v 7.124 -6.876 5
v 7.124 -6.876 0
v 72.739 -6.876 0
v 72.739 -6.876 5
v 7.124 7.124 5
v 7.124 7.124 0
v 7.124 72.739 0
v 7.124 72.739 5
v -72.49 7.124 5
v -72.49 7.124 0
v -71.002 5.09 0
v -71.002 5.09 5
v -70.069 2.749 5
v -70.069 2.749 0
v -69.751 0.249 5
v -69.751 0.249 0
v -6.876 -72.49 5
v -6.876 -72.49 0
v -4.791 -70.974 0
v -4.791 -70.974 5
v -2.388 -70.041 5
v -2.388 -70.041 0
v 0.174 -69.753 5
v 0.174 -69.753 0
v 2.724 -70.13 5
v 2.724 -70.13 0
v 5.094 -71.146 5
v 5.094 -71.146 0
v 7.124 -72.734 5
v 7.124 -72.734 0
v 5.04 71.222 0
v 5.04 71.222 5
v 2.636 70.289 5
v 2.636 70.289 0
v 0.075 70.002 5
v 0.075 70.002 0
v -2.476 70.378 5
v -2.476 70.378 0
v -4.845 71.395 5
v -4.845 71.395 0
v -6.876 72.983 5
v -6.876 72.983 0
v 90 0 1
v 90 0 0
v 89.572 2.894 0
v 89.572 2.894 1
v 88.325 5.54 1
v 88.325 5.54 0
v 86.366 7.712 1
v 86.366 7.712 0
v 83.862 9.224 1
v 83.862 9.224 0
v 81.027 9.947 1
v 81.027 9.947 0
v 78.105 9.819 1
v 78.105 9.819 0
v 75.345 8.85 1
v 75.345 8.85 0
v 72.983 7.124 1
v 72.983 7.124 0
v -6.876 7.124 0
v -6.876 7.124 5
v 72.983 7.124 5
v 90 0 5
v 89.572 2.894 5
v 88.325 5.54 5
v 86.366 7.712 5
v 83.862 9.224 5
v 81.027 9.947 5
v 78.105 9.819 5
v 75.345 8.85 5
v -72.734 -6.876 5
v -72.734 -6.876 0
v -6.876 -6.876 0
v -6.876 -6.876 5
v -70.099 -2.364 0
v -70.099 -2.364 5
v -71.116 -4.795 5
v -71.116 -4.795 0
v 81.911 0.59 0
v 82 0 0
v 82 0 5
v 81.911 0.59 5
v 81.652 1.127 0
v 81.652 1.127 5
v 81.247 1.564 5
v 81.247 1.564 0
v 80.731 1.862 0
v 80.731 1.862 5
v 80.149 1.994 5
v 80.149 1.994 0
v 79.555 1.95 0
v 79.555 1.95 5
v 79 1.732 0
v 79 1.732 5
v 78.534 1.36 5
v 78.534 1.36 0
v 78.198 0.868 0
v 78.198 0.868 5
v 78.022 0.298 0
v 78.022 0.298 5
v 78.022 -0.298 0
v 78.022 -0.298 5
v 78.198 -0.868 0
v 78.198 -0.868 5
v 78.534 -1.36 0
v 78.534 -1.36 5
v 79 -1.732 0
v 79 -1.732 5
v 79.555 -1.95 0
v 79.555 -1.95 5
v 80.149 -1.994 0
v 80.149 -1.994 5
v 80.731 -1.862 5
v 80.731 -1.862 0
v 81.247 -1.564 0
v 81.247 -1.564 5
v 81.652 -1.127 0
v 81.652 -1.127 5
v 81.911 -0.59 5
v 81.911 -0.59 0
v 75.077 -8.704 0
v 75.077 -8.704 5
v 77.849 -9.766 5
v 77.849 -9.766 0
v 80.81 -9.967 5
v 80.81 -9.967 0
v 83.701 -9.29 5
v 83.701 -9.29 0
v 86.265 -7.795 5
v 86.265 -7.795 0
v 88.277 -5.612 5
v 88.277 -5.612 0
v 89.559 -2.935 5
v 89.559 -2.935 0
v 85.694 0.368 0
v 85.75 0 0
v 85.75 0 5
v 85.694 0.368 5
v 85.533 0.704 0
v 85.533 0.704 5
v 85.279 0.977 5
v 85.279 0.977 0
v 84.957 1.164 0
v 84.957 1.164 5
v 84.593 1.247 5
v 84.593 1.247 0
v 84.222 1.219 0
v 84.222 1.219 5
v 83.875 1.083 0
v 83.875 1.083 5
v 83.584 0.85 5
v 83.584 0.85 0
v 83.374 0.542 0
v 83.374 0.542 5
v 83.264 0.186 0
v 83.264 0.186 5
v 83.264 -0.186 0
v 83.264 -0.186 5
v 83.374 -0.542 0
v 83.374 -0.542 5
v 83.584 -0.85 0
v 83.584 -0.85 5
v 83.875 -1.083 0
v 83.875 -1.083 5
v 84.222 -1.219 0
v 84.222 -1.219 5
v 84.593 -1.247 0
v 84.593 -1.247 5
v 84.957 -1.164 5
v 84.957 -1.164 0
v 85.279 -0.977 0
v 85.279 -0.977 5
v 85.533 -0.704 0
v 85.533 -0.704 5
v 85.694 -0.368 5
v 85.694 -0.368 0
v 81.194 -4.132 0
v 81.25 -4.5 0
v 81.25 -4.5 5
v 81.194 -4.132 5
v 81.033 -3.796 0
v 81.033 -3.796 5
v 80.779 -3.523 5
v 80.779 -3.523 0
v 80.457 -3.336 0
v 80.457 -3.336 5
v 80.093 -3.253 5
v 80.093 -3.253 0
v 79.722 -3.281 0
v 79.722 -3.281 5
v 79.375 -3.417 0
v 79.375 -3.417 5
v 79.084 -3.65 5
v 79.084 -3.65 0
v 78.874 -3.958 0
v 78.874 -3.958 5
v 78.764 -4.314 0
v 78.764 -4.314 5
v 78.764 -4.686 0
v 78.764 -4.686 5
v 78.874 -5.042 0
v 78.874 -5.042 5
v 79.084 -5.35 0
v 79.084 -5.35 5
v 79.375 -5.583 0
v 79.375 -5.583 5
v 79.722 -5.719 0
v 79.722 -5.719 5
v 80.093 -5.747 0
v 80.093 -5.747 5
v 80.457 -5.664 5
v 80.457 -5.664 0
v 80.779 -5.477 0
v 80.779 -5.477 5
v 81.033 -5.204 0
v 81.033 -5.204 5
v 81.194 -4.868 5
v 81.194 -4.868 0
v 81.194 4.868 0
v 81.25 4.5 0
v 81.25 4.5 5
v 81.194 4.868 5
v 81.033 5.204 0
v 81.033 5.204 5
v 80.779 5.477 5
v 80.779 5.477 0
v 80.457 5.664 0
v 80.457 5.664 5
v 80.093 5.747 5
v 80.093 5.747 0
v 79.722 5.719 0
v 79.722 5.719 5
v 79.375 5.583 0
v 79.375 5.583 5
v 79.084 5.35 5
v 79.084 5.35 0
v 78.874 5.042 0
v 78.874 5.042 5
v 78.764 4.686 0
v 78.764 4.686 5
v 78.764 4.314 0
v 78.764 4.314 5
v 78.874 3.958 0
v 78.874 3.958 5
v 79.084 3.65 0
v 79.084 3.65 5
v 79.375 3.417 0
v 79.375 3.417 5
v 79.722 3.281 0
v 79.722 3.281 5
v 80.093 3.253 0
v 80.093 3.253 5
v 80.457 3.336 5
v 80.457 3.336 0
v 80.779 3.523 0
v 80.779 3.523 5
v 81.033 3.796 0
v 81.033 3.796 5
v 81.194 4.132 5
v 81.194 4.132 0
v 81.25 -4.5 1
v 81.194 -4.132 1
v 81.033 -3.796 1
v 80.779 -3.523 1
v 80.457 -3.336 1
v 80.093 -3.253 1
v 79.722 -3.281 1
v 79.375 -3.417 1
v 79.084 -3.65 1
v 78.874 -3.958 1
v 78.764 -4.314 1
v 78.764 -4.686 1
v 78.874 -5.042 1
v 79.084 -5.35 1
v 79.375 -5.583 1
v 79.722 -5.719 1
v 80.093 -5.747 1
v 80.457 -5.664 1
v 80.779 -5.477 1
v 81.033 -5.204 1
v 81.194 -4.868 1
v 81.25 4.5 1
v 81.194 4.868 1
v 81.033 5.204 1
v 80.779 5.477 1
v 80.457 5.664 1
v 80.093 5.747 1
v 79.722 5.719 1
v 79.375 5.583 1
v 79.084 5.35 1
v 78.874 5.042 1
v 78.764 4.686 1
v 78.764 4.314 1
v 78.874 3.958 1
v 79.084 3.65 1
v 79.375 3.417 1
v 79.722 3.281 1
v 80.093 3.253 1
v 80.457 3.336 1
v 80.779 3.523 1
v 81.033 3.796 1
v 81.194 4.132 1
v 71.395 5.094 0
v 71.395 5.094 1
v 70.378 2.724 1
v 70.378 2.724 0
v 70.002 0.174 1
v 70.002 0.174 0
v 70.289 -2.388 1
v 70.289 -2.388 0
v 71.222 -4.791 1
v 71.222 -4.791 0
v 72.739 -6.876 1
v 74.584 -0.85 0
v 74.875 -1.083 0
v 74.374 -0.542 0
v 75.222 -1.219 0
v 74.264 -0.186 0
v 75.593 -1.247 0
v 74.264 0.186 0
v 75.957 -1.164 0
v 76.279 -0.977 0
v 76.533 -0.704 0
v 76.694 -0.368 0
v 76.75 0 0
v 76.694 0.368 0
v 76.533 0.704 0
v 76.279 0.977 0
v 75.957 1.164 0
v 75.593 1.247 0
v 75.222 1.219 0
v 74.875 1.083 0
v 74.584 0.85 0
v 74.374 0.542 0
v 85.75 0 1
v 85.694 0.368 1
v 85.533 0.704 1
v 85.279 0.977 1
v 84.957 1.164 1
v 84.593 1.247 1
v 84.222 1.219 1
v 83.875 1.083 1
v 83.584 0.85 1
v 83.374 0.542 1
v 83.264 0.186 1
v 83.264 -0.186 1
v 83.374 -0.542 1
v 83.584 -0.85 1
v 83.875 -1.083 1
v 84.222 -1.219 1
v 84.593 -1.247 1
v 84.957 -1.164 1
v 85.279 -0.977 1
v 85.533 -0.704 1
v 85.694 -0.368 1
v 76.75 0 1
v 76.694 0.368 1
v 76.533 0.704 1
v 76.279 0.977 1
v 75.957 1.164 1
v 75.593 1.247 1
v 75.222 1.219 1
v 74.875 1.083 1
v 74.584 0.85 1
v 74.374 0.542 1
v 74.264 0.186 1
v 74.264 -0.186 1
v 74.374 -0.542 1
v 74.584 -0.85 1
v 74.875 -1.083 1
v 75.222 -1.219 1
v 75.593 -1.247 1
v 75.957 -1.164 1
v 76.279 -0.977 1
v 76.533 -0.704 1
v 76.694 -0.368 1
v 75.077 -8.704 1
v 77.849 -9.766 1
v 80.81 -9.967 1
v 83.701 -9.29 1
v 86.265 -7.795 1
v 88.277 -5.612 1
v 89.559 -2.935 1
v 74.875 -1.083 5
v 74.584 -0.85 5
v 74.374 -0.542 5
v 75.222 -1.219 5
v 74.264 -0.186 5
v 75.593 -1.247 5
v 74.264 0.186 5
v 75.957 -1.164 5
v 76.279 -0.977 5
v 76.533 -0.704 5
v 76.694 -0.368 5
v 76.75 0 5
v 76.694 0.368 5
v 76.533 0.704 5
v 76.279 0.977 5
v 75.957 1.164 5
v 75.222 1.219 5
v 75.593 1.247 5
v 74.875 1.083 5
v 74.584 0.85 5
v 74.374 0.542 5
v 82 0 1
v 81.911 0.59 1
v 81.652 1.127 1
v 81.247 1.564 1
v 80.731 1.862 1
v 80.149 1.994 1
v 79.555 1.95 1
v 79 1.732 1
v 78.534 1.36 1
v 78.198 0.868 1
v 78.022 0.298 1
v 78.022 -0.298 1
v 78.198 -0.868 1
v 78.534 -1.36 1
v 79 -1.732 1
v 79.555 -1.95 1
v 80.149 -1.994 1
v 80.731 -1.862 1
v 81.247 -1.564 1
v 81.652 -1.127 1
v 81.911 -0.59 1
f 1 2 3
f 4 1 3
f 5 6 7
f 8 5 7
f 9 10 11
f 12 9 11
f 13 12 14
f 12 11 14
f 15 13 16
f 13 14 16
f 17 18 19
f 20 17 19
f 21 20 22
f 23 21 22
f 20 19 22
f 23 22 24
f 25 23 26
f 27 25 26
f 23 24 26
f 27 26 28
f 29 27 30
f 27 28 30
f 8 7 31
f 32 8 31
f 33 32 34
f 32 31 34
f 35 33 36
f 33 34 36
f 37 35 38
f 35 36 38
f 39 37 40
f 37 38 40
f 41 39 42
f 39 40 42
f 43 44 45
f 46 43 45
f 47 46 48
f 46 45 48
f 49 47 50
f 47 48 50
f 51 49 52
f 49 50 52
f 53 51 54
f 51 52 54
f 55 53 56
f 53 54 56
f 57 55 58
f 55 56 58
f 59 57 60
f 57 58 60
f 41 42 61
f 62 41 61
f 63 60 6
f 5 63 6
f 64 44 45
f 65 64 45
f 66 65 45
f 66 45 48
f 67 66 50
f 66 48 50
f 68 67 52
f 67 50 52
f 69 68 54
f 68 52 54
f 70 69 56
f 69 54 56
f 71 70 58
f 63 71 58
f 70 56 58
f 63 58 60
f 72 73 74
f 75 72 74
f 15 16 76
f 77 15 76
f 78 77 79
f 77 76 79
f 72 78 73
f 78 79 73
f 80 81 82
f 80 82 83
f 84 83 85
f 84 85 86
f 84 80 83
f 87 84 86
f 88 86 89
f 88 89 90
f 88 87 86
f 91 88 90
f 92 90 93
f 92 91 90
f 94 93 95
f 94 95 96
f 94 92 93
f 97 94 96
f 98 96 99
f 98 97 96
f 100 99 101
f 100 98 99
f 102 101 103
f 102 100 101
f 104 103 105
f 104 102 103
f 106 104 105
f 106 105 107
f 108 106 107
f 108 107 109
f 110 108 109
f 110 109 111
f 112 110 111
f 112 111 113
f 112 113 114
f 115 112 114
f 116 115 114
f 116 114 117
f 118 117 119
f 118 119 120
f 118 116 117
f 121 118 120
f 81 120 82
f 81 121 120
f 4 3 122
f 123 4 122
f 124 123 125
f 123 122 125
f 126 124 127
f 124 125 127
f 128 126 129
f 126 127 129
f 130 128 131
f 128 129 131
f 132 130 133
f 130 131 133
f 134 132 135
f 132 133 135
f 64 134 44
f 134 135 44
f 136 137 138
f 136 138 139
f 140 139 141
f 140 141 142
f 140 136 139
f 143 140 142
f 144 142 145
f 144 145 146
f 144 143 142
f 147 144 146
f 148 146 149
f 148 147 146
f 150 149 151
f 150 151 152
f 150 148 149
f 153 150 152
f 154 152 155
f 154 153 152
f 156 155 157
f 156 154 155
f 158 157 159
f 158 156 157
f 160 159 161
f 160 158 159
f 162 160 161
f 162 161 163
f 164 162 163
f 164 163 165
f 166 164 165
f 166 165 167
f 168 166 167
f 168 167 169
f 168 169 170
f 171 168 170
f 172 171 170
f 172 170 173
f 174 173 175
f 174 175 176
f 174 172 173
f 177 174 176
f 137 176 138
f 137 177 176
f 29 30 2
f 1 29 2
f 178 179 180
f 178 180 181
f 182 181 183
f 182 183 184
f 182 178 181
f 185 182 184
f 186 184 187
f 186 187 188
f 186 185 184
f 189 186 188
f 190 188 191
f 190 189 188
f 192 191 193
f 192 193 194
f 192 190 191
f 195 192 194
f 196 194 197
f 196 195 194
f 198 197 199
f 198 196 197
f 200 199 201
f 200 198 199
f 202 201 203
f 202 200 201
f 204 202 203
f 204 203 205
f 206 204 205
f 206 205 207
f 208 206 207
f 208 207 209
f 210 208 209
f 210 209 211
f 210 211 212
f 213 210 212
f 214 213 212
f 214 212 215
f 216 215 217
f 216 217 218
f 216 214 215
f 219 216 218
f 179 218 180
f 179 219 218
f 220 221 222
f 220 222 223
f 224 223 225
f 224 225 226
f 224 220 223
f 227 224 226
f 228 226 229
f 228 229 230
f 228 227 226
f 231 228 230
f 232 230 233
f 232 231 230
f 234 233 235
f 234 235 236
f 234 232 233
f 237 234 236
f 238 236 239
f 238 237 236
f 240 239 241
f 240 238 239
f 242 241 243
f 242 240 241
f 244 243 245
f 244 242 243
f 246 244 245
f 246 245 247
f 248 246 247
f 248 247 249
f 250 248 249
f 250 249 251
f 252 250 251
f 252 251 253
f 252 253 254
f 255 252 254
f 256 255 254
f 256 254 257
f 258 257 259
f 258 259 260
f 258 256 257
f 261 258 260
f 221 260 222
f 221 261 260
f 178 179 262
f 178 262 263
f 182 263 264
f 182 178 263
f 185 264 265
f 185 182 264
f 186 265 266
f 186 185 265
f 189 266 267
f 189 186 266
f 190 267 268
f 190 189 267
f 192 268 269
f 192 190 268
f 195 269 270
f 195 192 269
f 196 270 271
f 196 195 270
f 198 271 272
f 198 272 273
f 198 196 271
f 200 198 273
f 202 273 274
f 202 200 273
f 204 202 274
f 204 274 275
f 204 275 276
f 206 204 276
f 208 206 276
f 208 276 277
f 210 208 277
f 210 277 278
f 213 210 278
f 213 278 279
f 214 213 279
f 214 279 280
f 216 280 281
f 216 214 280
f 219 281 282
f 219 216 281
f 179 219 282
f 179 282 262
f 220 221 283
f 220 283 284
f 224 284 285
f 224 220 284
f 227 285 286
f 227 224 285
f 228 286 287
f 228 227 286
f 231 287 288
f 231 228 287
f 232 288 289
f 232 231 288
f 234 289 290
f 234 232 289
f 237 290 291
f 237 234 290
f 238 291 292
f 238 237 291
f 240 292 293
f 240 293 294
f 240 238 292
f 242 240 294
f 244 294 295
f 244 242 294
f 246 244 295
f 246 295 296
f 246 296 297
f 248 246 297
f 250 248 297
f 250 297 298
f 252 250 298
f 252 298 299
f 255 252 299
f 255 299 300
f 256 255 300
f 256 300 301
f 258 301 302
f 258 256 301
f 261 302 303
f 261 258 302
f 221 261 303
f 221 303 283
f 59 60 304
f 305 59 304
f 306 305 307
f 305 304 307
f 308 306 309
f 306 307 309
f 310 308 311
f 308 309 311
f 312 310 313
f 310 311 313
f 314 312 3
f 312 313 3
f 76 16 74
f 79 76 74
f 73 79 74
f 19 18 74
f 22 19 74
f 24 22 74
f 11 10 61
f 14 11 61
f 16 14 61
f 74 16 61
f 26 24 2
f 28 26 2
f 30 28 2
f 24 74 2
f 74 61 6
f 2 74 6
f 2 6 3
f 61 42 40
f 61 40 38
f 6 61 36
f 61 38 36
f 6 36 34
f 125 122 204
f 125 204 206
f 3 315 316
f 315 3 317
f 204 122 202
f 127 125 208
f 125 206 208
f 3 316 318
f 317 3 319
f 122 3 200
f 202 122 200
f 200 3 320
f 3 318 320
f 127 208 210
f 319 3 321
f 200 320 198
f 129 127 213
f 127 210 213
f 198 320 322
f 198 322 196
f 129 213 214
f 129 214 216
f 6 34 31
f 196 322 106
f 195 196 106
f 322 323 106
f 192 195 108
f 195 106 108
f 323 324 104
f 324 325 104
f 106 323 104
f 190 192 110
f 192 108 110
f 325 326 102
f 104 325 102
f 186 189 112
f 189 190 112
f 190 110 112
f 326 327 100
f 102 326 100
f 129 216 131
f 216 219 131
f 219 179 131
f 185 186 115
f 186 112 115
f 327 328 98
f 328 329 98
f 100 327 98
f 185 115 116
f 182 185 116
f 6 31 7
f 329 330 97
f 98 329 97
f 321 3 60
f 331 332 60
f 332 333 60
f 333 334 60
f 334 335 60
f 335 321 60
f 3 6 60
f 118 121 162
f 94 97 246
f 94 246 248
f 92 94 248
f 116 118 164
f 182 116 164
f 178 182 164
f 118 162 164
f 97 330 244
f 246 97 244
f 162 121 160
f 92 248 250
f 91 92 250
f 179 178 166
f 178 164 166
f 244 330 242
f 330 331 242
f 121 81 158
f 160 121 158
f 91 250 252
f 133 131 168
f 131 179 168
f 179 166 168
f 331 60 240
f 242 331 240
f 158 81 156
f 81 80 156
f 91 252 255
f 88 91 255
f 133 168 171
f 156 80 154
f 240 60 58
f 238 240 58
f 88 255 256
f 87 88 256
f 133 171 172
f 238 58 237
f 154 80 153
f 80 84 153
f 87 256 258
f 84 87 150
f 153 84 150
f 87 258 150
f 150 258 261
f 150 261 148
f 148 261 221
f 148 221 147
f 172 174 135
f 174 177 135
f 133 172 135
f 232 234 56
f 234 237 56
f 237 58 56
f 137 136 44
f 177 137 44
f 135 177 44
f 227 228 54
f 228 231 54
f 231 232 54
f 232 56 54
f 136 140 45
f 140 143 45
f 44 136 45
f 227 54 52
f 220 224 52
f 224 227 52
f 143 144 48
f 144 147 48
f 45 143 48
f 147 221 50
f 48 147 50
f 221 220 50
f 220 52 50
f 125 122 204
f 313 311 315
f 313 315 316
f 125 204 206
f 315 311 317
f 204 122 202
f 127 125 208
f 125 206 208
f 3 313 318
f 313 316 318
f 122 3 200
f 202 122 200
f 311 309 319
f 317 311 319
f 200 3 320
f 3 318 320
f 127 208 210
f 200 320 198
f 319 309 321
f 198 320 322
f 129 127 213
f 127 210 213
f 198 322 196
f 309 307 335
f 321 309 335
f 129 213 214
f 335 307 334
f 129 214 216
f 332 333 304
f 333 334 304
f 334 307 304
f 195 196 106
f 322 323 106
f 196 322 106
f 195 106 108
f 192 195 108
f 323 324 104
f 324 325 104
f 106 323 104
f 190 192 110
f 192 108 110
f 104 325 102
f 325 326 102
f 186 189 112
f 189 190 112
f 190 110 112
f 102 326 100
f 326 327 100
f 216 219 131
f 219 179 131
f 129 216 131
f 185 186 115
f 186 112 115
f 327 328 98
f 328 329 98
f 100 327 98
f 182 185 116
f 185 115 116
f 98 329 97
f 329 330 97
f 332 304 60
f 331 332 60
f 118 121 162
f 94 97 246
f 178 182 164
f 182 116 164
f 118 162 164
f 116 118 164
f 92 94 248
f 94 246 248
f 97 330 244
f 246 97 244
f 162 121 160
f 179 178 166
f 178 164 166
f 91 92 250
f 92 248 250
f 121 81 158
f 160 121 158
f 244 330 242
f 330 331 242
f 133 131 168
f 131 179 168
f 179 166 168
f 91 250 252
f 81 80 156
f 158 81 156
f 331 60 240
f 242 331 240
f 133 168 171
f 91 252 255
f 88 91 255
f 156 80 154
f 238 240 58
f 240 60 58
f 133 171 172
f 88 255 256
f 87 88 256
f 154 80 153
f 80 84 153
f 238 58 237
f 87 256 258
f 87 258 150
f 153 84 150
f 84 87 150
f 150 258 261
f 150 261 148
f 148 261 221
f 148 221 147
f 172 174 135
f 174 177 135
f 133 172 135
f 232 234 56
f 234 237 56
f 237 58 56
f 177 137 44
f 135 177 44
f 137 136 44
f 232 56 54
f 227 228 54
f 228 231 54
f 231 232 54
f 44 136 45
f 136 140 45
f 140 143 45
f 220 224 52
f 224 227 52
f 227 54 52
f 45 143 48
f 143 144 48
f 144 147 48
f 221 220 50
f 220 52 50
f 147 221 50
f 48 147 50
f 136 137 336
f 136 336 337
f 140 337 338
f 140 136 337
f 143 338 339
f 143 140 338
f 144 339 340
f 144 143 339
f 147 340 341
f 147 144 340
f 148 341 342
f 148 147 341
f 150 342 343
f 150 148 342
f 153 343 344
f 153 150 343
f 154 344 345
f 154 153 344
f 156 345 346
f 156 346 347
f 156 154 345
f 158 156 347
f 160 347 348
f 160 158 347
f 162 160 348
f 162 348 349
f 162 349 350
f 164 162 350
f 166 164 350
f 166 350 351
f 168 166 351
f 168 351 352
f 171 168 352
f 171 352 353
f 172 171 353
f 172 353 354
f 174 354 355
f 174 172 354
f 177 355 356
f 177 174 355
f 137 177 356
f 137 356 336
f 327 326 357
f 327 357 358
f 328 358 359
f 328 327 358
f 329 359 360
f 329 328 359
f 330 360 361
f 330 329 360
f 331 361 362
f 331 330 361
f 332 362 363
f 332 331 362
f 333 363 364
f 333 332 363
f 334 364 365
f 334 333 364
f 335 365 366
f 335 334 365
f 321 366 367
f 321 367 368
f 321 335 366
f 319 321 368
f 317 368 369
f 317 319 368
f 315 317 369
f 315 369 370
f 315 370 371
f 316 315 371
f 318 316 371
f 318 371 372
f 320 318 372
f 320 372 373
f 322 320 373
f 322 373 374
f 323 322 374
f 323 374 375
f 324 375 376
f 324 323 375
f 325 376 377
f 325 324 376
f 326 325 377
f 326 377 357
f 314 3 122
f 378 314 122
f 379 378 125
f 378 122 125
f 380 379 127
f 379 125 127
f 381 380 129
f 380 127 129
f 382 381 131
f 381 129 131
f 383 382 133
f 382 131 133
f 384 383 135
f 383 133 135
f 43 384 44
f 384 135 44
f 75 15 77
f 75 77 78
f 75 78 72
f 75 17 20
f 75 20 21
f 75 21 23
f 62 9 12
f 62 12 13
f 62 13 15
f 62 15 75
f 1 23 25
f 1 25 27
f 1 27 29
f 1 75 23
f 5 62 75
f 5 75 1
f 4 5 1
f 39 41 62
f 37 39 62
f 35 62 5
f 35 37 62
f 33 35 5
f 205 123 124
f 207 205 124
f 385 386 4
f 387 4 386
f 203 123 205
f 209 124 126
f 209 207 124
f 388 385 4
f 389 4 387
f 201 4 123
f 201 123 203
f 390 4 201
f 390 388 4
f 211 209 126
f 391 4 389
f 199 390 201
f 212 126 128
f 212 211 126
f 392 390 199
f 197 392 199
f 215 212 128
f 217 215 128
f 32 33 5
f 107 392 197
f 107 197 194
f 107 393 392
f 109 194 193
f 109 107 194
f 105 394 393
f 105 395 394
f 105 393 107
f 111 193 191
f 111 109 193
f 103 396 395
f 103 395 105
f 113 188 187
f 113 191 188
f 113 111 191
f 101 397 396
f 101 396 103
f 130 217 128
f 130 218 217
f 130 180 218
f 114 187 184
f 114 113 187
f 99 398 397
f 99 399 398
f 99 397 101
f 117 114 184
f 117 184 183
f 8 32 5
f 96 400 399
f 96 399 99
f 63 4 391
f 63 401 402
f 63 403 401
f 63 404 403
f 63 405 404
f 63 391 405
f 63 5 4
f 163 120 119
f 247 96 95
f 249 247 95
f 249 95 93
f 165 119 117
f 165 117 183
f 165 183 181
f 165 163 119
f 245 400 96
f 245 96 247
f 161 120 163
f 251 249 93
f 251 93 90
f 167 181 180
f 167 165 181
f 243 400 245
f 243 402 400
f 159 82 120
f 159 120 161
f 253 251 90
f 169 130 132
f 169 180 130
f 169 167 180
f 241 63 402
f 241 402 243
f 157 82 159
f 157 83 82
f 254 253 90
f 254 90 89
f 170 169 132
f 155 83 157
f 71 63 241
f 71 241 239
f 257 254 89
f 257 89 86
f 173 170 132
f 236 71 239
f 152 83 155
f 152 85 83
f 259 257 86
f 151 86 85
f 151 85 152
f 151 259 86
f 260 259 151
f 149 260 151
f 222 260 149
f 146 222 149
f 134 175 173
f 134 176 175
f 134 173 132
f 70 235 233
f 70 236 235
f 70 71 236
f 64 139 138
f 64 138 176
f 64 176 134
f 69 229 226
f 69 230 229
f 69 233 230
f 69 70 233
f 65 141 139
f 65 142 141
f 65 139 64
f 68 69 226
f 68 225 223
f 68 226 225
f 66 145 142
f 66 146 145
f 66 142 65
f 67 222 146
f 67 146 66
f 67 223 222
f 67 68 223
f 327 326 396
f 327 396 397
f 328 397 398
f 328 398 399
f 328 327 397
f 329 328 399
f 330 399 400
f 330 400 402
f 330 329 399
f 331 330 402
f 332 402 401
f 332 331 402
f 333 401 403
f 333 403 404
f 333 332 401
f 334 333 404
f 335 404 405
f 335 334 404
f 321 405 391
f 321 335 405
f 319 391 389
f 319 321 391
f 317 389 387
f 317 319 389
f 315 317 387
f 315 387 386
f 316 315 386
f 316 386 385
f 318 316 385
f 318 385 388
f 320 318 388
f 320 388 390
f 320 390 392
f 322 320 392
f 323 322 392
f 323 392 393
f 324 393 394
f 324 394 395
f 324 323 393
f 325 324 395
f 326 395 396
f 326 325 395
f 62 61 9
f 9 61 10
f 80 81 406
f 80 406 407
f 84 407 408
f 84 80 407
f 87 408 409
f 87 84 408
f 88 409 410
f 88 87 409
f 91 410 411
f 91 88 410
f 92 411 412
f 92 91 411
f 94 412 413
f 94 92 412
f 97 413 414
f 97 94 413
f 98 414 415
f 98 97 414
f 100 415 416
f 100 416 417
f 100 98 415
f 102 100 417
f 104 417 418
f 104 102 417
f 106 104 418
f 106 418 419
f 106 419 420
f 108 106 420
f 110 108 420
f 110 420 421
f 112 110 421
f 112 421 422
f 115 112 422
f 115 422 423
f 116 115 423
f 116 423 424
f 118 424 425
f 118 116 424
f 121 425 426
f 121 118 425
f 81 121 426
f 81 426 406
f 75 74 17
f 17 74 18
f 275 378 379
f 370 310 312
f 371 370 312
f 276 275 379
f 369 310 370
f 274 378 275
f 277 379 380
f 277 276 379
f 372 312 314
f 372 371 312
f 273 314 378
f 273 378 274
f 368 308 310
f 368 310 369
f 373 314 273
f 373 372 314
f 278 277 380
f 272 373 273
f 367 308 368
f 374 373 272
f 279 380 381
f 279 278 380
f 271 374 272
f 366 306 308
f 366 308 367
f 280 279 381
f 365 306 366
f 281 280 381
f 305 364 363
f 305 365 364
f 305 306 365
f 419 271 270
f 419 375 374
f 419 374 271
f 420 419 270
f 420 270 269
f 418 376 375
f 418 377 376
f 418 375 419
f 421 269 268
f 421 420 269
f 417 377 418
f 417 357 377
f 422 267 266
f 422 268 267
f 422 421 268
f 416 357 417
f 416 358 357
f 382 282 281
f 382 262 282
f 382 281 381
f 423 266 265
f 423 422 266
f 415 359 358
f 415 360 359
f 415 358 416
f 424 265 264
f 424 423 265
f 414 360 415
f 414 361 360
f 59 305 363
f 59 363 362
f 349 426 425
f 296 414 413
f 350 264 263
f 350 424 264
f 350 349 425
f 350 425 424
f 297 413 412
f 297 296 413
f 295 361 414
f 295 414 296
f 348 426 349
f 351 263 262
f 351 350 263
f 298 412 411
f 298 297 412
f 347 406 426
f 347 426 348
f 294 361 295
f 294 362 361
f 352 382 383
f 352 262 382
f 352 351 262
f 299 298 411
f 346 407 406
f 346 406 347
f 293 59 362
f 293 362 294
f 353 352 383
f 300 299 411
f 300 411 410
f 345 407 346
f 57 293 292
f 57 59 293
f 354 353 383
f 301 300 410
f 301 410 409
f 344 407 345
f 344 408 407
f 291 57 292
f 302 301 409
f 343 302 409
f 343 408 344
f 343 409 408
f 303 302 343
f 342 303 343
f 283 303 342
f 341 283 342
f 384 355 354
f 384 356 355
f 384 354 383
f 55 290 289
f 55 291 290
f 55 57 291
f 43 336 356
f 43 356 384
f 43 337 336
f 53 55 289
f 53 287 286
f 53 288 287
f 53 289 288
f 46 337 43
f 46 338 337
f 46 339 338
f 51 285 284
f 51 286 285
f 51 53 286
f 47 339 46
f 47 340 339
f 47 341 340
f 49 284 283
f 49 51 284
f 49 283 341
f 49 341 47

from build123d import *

# Parameters (mm, degrees)
F0_R     = 1.25
F0_R_2   = 2
F1_DEPTH = 5
F2_DEPTH = 1


with BuildPart() as f1:
    # F0 (on Top) → F1 (new body)
    with BuildSketch(Plane.XY):
        with BuildLine():
            ThreePointArc((72.7387571288, -6.8756346591), (83.7005115381, -9.2901137967), (90, 0))
            ThreePointArc((90, 0), (83.861757699, 9.2242521363), (72.9826345051, 7.1243653409))
            ThreePointArc((72.9826345051, 7.1243653409), (70.0015169041, 0.1741717018), (72.7387571288, -6.8756346591))
        make_face()
        with Locations((75.5, 0)):
            Circle(F0_R, mode=Mode.SUBTRACT)
        with Locations((80, -4.5)):
            Circle(F0_R, mode=Mode.SUBTRACT)
        with Locations((80, 0)):
            Circle(F0_R_2, mode=Mode.SUBTRACT)
        with Locations((84.5, 0)):
            Circle(F0_R, mode=Mode.SUBTRACT)
        with Locations((80, 4.5)):
            Circle(F0_R, mode=Mode.SUBTRACT)
        with BuildLine():
            ThreePointArc((72.7387571288, -6.8756346591), (70.0015169041, 0.1741717018), (72.9826345051, 7.1243653409))
            Line((72.9826345051, 7.1243653409), (7.1243653409, 7.1243653409))
            Line((7.1243653409, 7.1243653409), (7.1243653409, 0.2487306818))
            Line((7.1243653409, 0.2487306818), (7.1243653409, 0))
            Line((7.1243653409, 0), (7.1243653409, -6.8756346591))
            Line((7.1243653409, -6.8756346591), (72.7387571288, -6.8756346591))
        make_face()
        Polygon((7.1243653409, 0.2487306818), (7.1243653409, 7.1243653409), (0.2487306818, 7.1243653409), (0, 7.1243653409), (-6.8756346591, 7.1243653409), (-6.8756346591, 0.2487306818), (-6.8756346591, 0), (-6.8756346591, -6.8756346591), (0, -6.8756346591), (0.2487306818, -6.8756346591), (7.1243653409, -6.8756346591), (7.1243653409, 0), align=None)
        with BuildLine():
            Line((0.2487306818, 7.1243653409), (7.1243653409, 7.1243653409))
            Line((7.1243653409, 7.1243653409), (7.1243653409, 72.7387571288))
            ThreePointArc((7.1243653409, 72.7387571288), (0.0745589801, 70.0015169041), (-6.8756346591, 72.9826345051))
            Line((-6.8756346591, 72.9826345051), (-6.8756346591, 7.1243653409))
            Line((-6.8756346591, 7.1243653409), (0, 7.1243653409))
            Line((0, 7.1243653409), (0.2487306818, 7.1243653409))
        make_face()
        with BuildLine():
            Line((7.1243653409, -72.7339038233), (7.1243653409, -6.8756346591))
            Line((7.1243653409, -6.8756346591), (0.2487306818, -6.8756346591))
            Line((0.2487306818, -6.8756346591), (0, -6.8756346591))
            Line((0, -6.8756346591), (-6.8756346591, -6.8756346591))
            Line((-6.8756346591, -6.8756346591), (-6.8756346591, -72.4900264469))
            ThreePointArc((-6.8756346591, -72.4900264469), (0.1741717018, -69.7527862223), (7.1243653409, -72.7339038233))
        make_face()
        with BuildLine():
            Line((-6.8756346591, 0.2487306818), (-6.8756346591, 7.1243653409))
            Line((-6.8756346591, 7.1243653409), (-72.4900264469, 7.1243653409))
            ThreePointArc((-72.4900264469, 7.1243653409), (-70.4611555214, 3.94924222), (-69.7512693182, 0.2487306818))
            ThreePointArc((-69.7512693182, 0.2487306818), (-70.5270171818, -3.6130270171), (-72.7339038233, -6.8756346591))
            Line((-72.7339038233, -6.8756346591), (-6.8756346591, -6.8756346591))
            Line((-6.8756346591, -6.8756346591), (-6.8756346591, 0))
            Line((-6.8756346591, 0), (-6.8756346591, 0.2487306818))
        make_face()
    extrude(amount=F1_DEPTH)


with BuildPart() as f2:
    # F0 (on Top) → F2 (new body)
    with BuildSketch(Plane.XY):
        with BuildLine():
            ThreePointArc((72.7387571288, -6.8756346591), (83.7005115381, -9.2901137967), (90, 0))
            ThreePointArc((90, 0), (83.861757699, 9.2242521363), (72.9826345051, 7.1243653409))
            ThreePointArc((72.9826345051, 7.1243653409), (70.0015169041, 0.1741717018), (72.7387571288, -6.8756346591))
        make_face()
        with Locations((75.5, 0)):
            Circle(F0_R, mode=Mode.SUBTRACT)
        with Locations((80, -4.5)):
            Circle(F0_R, mode=Mode.SUBTRACT)
        with Locations((80, 0)):
            Circle(F0_R_2, mode=Mode.SUBTRACT)
        with Locations((84.5, 0)):
            Circle(F0_R, mode=Mode.SUBTRACT)
        with Locations((80, 4.5)):
            Circle(F0_R, mode=Mode.SUBTRACT)
    extrude(amount=F2_DEPTH)


solid = Compound([f1.part, f2.part])
